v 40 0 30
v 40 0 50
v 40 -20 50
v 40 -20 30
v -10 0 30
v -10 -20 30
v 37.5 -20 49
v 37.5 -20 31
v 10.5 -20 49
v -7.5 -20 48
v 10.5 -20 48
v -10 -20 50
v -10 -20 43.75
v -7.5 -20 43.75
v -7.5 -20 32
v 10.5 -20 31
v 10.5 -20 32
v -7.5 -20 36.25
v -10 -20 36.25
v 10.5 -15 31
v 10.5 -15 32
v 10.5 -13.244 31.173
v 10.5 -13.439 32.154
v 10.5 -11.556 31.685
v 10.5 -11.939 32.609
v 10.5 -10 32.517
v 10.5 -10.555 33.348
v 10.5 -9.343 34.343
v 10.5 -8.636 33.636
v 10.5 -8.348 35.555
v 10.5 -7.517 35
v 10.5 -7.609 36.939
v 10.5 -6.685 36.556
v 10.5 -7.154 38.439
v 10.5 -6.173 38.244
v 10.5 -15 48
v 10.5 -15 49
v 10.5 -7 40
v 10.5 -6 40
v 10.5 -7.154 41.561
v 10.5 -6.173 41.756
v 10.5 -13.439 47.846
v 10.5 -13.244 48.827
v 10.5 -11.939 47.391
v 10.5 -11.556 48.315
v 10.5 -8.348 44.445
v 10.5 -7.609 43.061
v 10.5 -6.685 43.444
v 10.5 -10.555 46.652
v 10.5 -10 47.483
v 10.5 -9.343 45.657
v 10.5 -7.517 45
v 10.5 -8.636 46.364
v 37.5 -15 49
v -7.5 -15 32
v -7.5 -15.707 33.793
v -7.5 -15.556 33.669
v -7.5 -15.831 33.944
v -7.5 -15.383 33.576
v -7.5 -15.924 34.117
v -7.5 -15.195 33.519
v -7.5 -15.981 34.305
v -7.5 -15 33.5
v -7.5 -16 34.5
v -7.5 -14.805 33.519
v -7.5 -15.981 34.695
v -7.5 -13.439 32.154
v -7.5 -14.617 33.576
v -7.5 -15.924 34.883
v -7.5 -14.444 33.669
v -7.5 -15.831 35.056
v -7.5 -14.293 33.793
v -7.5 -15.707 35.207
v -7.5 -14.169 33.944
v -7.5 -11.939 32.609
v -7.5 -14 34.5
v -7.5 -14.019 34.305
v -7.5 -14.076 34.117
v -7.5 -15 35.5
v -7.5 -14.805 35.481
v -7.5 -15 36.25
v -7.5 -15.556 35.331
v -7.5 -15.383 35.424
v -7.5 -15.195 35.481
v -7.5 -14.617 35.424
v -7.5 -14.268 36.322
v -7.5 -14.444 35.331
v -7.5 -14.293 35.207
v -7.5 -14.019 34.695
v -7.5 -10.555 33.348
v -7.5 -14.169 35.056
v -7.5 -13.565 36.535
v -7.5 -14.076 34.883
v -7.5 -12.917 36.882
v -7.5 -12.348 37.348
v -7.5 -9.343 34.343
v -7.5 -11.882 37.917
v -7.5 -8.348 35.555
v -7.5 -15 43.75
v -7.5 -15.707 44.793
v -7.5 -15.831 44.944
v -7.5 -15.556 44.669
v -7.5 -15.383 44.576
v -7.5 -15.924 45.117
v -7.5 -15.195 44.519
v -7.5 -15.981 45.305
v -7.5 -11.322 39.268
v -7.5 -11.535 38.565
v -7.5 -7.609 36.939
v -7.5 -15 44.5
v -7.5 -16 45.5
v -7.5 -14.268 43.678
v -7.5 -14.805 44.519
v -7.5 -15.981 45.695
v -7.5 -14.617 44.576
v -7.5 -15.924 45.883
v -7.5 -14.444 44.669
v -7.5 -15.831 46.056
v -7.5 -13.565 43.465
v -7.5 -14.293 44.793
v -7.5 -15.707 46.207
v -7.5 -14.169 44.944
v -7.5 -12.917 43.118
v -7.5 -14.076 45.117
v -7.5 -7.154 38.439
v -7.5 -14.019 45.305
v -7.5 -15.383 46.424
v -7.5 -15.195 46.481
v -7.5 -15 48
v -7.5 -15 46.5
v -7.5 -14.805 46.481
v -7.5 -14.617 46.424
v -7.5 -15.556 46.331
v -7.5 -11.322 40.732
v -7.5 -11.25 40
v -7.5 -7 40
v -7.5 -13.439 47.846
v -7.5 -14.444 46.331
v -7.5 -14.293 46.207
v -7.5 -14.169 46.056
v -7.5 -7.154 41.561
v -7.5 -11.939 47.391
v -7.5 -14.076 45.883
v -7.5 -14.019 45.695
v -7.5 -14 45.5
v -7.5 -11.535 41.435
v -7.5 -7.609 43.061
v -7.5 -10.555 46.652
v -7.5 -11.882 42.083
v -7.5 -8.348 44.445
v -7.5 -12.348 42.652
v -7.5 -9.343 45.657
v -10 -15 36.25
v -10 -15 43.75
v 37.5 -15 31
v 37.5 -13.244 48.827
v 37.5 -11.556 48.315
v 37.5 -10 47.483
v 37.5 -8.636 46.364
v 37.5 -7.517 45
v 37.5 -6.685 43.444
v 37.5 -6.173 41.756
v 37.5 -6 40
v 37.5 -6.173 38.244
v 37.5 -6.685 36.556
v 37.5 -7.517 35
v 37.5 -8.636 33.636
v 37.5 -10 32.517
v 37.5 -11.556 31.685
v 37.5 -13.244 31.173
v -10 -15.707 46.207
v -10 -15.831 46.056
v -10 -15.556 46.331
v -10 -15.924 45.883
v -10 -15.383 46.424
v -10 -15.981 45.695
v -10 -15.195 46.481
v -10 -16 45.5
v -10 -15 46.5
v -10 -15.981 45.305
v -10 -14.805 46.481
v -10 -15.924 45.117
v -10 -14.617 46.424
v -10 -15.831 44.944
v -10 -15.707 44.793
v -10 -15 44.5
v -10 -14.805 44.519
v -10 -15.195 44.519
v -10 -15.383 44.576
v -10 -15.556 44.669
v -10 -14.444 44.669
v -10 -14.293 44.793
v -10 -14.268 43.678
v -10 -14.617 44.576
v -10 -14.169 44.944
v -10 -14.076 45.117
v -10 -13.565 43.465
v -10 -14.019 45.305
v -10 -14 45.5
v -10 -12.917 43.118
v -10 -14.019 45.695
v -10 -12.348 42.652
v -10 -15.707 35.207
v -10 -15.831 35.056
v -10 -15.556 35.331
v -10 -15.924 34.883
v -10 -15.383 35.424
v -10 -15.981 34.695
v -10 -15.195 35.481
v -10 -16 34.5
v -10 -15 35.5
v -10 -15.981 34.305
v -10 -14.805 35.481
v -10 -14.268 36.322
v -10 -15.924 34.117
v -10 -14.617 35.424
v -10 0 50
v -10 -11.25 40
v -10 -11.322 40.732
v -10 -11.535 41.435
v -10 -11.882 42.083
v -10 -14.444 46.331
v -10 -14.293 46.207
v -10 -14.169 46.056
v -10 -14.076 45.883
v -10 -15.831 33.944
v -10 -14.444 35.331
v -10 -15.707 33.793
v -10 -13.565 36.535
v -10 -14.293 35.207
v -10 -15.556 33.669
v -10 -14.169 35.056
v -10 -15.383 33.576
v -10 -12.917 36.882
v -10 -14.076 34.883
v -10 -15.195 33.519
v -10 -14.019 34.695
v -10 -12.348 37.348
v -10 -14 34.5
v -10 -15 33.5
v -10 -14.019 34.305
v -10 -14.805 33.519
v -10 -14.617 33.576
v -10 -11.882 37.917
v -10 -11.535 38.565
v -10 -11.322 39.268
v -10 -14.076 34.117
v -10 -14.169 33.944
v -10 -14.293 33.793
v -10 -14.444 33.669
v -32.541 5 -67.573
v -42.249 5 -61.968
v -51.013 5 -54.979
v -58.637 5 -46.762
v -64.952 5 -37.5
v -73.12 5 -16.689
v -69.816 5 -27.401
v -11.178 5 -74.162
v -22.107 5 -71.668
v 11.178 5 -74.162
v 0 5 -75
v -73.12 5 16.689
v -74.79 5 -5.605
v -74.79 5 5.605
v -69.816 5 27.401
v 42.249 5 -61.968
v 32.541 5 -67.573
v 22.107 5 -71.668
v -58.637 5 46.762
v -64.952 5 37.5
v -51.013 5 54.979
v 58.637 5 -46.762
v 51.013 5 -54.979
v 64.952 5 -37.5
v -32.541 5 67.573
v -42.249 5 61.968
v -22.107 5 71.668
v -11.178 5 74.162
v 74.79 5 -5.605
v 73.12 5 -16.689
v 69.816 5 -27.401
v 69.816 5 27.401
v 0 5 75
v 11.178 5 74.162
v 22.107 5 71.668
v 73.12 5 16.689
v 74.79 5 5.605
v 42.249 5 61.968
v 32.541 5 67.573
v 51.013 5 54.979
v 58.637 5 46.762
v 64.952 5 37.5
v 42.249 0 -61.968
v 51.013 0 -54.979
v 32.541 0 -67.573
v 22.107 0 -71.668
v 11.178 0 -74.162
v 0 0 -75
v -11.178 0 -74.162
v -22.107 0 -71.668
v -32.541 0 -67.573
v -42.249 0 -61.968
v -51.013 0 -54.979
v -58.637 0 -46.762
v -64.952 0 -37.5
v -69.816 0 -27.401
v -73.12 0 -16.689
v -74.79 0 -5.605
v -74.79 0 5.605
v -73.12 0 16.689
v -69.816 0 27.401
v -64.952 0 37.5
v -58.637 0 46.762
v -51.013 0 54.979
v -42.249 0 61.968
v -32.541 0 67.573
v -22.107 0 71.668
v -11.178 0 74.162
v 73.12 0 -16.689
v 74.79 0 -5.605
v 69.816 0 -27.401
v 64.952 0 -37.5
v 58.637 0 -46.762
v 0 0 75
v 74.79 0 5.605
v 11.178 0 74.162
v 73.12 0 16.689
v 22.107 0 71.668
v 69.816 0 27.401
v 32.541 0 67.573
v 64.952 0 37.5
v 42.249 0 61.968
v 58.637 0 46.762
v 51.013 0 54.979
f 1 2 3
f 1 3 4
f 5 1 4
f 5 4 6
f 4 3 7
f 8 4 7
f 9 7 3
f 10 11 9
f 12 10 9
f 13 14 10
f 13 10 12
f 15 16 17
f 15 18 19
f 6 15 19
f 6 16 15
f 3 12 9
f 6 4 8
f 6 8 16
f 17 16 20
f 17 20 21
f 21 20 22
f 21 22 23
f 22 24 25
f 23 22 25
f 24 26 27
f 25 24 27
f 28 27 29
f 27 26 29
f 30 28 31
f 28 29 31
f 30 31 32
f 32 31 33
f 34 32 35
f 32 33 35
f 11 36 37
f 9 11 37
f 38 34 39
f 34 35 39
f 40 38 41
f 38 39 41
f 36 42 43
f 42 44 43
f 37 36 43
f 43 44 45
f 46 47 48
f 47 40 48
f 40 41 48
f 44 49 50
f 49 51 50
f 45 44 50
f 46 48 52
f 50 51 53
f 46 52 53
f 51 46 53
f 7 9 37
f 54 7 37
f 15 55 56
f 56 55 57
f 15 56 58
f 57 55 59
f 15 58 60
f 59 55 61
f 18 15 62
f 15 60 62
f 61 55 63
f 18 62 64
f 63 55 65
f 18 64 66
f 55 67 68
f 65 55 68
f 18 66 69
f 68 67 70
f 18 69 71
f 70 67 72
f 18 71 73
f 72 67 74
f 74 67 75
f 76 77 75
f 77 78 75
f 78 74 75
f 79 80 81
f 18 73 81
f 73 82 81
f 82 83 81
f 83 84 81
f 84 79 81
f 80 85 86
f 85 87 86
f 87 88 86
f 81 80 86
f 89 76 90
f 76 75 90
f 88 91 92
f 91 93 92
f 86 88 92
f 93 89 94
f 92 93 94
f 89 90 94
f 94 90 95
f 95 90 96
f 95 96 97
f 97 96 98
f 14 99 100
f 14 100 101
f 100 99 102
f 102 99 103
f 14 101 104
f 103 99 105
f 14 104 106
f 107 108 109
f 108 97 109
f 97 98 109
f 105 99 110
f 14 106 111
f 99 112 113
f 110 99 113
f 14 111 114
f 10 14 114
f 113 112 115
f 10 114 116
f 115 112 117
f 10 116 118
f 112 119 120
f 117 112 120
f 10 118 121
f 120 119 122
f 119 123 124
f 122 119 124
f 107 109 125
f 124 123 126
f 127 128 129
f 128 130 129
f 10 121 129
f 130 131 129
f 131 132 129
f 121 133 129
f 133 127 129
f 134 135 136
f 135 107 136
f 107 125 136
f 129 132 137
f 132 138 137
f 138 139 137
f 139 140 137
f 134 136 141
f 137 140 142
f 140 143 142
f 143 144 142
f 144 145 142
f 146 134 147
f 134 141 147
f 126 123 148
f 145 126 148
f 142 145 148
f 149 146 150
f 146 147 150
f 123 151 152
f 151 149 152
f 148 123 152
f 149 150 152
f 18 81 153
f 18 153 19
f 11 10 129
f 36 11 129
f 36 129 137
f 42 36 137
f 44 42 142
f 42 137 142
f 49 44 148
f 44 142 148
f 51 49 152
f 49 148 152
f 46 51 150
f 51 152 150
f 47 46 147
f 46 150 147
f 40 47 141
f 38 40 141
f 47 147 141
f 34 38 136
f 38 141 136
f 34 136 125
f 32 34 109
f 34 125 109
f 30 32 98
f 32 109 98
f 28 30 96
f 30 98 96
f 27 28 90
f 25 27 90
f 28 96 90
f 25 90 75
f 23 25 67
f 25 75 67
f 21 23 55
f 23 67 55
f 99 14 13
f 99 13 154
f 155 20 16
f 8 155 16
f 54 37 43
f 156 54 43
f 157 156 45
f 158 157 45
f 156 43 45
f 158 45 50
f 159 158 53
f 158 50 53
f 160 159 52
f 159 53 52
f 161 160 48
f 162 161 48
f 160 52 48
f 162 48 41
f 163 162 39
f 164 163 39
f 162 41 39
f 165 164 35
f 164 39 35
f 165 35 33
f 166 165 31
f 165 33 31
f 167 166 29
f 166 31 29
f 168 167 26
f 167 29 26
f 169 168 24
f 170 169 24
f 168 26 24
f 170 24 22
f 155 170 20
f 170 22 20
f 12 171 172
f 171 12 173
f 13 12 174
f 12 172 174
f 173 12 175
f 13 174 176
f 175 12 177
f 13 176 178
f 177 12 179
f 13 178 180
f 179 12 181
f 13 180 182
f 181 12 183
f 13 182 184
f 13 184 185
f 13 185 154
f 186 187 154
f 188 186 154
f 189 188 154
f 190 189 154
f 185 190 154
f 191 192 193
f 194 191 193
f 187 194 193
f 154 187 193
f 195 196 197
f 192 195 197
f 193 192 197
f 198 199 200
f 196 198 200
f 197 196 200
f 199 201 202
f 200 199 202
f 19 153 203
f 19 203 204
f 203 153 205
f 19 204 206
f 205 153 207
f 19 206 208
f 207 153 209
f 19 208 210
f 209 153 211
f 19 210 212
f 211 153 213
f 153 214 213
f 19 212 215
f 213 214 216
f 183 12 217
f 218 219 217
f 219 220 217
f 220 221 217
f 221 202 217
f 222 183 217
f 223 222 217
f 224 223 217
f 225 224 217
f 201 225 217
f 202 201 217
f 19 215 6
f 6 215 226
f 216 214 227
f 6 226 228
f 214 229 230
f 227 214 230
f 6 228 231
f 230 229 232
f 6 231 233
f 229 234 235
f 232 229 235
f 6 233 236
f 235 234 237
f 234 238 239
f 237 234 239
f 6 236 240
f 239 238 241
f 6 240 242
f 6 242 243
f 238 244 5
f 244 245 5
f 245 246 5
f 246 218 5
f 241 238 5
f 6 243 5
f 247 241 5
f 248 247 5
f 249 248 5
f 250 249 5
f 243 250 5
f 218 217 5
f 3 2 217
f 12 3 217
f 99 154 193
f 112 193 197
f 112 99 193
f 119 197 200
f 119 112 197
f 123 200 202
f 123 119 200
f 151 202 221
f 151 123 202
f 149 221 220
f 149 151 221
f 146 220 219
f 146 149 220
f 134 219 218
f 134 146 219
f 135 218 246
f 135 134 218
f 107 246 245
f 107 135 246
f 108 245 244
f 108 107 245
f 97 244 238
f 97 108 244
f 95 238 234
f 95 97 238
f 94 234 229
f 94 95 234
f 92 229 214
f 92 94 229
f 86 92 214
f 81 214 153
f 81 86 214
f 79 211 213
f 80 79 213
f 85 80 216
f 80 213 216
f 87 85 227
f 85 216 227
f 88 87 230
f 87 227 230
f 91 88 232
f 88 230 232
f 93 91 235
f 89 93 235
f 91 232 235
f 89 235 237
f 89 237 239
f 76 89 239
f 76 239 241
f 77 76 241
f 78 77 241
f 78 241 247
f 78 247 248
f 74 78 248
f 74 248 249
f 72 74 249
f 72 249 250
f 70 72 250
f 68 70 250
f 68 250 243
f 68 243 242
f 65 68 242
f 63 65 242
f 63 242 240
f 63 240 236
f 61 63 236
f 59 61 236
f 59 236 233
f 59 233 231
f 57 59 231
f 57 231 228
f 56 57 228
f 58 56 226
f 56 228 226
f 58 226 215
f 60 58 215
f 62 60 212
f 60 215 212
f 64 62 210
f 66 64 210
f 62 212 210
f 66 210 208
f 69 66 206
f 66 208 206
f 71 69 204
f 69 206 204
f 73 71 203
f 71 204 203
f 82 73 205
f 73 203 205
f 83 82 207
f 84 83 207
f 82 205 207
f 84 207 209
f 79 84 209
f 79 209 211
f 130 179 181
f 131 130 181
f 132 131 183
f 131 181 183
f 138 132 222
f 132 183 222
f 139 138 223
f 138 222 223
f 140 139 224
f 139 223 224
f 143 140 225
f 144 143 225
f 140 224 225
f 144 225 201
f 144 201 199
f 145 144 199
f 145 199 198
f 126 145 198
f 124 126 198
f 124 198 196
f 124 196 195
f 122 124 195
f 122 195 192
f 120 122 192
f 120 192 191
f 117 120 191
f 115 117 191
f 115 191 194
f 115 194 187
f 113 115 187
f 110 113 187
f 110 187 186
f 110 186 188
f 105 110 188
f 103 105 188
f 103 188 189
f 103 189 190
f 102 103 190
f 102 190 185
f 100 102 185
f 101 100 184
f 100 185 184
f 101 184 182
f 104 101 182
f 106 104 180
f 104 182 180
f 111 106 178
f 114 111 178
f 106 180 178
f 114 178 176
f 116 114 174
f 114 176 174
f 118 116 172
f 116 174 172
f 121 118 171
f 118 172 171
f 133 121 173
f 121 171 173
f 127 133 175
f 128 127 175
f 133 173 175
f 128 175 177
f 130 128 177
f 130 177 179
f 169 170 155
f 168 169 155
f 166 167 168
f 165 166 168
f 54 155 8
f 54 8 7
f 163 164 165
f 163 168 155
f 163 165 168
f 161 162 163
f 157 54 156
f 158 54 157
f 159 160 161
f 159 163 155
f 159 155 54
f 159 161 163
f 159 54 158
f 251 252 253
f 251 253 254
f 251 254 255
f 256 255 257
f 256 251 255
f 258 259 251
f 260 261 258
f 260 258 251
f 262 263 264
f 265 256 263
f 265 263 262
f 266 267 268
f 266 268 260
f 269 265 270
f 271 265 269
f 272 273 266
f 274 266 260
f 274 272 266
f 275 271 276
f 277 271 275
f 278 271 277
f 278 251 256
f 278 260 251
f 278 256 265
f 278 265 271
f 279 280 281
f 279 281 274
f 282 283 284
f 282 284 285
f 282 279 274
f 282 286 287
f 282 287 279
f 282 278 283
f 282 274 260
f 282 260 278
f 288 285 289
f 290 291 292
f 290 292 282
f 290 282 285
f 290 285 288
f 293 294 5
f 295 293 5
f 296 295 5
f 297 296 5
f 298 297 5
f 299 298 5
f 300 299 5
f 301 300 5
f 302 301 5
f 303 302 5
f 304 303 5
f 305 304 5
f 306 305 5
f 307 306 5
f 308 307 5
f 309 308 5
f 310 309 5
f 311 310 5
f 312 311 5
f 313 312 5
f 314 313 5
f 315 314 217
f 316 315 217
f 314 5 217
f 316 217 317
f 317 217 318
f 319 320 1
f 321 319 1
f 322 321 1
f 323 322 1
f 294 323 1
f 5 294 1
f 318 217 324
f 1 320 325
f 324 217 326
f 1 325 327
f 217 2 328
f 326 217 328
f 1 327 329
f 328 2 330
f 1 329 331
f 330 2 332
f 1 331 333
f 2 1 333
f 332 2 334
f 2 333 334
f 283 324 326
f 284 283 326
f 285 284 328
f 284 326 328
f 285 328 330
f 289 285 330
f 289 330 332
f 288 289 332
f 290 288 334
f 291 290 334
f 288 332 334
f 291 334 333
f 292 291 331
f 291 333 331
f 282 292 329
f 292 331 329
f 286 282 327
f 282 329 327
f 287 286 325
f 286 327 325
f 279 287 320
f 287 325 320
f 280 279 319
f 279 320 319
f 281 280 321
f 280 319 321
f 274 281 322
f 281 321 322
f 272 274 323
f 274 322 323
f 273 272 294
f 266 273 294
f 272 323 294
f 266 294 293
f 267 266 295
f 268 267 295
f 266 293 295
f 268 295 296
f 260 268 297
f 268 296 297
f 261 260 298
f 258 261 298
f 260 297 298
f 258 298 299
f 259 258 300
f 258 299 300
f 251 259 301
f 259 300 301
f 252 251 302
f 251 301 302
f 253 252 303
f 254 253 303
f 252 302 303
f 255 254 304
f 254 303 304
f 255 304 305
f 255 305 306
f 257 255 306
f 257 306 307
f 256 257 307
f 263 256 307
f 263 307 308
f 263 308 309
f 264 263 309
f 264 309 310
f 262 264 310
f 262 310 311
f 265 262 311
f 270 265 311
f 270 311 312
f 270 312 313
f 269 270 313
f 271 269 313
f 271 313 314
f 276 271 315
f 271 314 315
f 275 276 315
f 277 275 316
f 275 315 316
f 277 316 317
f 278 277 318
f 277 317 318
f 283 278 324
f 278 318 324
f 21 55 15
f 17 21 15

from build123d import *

# Parameters (mm, degrees)
SKETCH1_R           = 75
BOSS_EXTRUDE1_DEPTH = 5
SKETCH2_W           = 50
SKETCH2_H           = 20
BOSS_EXTRUDE2_DEPTH = 20
CUT_EXTRUDE1_START  = -2.5
CUT_EXTRUDE1_DEPTH  = 18
CUT_EXTRUDE2_DEPTH  = 27
CUT_EXTRUDE3_REACH  = 115.275
CUT_EXTRUDE4_REACH  = 117.109
SKETCH6_R           = 1


with BuildPart() as part:
    # Sketch1 → Boss-Extrude1 (new body)
    with BuildSketch(Plane(origin=(0, 0, 0), x_dir=(1, 0, 0), z_dir=(0, 1, 0))):
        with Locations(Location((0, 0, 0), (0, 0, 270))):
            Circle(SKETCH1_R)
    extrude(amount=BOSS_EXTRUDE1_DEPTH)

    # Sketch2 → Boss-Extrude2 (add)
    with BuildSketch(Plane(origin=(0, 0, 0), x_dir=(-1, 0, 0), z_dir=(0, -1, 0))):
        with Locations((-15, -40)):
            Rectangle(SKETCH2_W, SKETCH2_H)
    extrude(amount=BOSS_EXTRUDE2_DEPTH)

    # Sketch3 → Cut-Extrude1 (cut)
    with BuildSketch(Plane.ZY.offset(10).offset(CUT_EXTRUDE1_START)):
        with BuildLine():
            Line((32, -15), (32, -20))
            Line((32, -20), (48, -20))
            Line((48, -20), (48, -15))
            ThreePointArc((48, -15), (40, -7), (32, -15))
        make_face()
    extrude(amount=-CUT_EXTRUDE1_DEPTH, mode=Mode.SUBTRACT)

    # Sketch4 → Cut-Extrude2 (cut)
    with BuildSketch(Plane.ZY.offset(-10.5)):
        with BuildLine():
            Line((31, -15), (31, -20))
            Line((31, -20), (49, -20))
            Line((49, -20), (49, -15))
            ThreePointArc((49, -15), (40, -6), (31, -15))
        make_face()
    extrude(amount=-CUT_EXTRUDE2_DEPTH, mode=Mode.SUBTRACT)

    # Sketch5 → Cut-Extrude3 (cut, up to next)
    with BuildSketch(Plane(origin=(-7.5, 0, 0), x_dir=(0, 0, -1), z_dir=(1, 0, 0)), mode=Mode.PRIVATE) as cut_extrude3_sk1:
        with BuildLine():
            Line((-36.25, -15), (-36.25, -20))
            Line((-36.25, -20), (-43.75, -20))
            Line((-43.75, -20), (-43.75, -15))
            ThreePointArc((-43.75, -15), (-40, -11.25), (-36.25, -15))
        make_face()
    cut_extrude3_tool1 = extrude(cut_extrude3_sk1.sketch, amount=-CUT_EXTRUDE3_REACH, mode=Mode.PRIVATE) & part.part
    add(cut_extrude3_tool1.solids().sort_by_distance((-7.5, -15.983293, 40))[0], mode=Mode.SUBTRACT)

    # Sketch6 → Cut-Extrude4 (cut, up to next)
    with BuildSketch(Plane.ZY.offset(10), mode=Mode.PRIVATE) as cut_extrude4_sk1:
        with Locations((45.5, -15)):
            Circle(SKETCH6_R)
    cut_extrude4_tool1 = extrude(cut_extrude4_sk1.sketch, amount=-CUT_EXTRUDE4_REACH, mode=Mode.PRIVATE) & part.part
    # Sketch6 → Cut-Extrude4 (cut, up to next)
    with BuildSketch(Plane.ZY.offset(10), mode=Mode.PRIVATE) as cut_extrude4_sk2:
        with Locations((34.5, -15)):
            Circle(SKETCH6_R)
    cut_extrude4_tool2 = extrude(cut_extrude4_sk2.sketch, amount=-CUT_EXTRUDE4_REACH, mode=Mode.PRIVATE) & part.part
    add(cut_extrude4_tool1.solids().sort_by_distance((-10, -15, 45.5))[0], mode=Mode.SUBTRACT)
    add(cut_extrude4_tool2.solids().sort_by_distance((-10, -15, 34.5))[0], mode=Mode.SUBTRACT)


solid = part.part
